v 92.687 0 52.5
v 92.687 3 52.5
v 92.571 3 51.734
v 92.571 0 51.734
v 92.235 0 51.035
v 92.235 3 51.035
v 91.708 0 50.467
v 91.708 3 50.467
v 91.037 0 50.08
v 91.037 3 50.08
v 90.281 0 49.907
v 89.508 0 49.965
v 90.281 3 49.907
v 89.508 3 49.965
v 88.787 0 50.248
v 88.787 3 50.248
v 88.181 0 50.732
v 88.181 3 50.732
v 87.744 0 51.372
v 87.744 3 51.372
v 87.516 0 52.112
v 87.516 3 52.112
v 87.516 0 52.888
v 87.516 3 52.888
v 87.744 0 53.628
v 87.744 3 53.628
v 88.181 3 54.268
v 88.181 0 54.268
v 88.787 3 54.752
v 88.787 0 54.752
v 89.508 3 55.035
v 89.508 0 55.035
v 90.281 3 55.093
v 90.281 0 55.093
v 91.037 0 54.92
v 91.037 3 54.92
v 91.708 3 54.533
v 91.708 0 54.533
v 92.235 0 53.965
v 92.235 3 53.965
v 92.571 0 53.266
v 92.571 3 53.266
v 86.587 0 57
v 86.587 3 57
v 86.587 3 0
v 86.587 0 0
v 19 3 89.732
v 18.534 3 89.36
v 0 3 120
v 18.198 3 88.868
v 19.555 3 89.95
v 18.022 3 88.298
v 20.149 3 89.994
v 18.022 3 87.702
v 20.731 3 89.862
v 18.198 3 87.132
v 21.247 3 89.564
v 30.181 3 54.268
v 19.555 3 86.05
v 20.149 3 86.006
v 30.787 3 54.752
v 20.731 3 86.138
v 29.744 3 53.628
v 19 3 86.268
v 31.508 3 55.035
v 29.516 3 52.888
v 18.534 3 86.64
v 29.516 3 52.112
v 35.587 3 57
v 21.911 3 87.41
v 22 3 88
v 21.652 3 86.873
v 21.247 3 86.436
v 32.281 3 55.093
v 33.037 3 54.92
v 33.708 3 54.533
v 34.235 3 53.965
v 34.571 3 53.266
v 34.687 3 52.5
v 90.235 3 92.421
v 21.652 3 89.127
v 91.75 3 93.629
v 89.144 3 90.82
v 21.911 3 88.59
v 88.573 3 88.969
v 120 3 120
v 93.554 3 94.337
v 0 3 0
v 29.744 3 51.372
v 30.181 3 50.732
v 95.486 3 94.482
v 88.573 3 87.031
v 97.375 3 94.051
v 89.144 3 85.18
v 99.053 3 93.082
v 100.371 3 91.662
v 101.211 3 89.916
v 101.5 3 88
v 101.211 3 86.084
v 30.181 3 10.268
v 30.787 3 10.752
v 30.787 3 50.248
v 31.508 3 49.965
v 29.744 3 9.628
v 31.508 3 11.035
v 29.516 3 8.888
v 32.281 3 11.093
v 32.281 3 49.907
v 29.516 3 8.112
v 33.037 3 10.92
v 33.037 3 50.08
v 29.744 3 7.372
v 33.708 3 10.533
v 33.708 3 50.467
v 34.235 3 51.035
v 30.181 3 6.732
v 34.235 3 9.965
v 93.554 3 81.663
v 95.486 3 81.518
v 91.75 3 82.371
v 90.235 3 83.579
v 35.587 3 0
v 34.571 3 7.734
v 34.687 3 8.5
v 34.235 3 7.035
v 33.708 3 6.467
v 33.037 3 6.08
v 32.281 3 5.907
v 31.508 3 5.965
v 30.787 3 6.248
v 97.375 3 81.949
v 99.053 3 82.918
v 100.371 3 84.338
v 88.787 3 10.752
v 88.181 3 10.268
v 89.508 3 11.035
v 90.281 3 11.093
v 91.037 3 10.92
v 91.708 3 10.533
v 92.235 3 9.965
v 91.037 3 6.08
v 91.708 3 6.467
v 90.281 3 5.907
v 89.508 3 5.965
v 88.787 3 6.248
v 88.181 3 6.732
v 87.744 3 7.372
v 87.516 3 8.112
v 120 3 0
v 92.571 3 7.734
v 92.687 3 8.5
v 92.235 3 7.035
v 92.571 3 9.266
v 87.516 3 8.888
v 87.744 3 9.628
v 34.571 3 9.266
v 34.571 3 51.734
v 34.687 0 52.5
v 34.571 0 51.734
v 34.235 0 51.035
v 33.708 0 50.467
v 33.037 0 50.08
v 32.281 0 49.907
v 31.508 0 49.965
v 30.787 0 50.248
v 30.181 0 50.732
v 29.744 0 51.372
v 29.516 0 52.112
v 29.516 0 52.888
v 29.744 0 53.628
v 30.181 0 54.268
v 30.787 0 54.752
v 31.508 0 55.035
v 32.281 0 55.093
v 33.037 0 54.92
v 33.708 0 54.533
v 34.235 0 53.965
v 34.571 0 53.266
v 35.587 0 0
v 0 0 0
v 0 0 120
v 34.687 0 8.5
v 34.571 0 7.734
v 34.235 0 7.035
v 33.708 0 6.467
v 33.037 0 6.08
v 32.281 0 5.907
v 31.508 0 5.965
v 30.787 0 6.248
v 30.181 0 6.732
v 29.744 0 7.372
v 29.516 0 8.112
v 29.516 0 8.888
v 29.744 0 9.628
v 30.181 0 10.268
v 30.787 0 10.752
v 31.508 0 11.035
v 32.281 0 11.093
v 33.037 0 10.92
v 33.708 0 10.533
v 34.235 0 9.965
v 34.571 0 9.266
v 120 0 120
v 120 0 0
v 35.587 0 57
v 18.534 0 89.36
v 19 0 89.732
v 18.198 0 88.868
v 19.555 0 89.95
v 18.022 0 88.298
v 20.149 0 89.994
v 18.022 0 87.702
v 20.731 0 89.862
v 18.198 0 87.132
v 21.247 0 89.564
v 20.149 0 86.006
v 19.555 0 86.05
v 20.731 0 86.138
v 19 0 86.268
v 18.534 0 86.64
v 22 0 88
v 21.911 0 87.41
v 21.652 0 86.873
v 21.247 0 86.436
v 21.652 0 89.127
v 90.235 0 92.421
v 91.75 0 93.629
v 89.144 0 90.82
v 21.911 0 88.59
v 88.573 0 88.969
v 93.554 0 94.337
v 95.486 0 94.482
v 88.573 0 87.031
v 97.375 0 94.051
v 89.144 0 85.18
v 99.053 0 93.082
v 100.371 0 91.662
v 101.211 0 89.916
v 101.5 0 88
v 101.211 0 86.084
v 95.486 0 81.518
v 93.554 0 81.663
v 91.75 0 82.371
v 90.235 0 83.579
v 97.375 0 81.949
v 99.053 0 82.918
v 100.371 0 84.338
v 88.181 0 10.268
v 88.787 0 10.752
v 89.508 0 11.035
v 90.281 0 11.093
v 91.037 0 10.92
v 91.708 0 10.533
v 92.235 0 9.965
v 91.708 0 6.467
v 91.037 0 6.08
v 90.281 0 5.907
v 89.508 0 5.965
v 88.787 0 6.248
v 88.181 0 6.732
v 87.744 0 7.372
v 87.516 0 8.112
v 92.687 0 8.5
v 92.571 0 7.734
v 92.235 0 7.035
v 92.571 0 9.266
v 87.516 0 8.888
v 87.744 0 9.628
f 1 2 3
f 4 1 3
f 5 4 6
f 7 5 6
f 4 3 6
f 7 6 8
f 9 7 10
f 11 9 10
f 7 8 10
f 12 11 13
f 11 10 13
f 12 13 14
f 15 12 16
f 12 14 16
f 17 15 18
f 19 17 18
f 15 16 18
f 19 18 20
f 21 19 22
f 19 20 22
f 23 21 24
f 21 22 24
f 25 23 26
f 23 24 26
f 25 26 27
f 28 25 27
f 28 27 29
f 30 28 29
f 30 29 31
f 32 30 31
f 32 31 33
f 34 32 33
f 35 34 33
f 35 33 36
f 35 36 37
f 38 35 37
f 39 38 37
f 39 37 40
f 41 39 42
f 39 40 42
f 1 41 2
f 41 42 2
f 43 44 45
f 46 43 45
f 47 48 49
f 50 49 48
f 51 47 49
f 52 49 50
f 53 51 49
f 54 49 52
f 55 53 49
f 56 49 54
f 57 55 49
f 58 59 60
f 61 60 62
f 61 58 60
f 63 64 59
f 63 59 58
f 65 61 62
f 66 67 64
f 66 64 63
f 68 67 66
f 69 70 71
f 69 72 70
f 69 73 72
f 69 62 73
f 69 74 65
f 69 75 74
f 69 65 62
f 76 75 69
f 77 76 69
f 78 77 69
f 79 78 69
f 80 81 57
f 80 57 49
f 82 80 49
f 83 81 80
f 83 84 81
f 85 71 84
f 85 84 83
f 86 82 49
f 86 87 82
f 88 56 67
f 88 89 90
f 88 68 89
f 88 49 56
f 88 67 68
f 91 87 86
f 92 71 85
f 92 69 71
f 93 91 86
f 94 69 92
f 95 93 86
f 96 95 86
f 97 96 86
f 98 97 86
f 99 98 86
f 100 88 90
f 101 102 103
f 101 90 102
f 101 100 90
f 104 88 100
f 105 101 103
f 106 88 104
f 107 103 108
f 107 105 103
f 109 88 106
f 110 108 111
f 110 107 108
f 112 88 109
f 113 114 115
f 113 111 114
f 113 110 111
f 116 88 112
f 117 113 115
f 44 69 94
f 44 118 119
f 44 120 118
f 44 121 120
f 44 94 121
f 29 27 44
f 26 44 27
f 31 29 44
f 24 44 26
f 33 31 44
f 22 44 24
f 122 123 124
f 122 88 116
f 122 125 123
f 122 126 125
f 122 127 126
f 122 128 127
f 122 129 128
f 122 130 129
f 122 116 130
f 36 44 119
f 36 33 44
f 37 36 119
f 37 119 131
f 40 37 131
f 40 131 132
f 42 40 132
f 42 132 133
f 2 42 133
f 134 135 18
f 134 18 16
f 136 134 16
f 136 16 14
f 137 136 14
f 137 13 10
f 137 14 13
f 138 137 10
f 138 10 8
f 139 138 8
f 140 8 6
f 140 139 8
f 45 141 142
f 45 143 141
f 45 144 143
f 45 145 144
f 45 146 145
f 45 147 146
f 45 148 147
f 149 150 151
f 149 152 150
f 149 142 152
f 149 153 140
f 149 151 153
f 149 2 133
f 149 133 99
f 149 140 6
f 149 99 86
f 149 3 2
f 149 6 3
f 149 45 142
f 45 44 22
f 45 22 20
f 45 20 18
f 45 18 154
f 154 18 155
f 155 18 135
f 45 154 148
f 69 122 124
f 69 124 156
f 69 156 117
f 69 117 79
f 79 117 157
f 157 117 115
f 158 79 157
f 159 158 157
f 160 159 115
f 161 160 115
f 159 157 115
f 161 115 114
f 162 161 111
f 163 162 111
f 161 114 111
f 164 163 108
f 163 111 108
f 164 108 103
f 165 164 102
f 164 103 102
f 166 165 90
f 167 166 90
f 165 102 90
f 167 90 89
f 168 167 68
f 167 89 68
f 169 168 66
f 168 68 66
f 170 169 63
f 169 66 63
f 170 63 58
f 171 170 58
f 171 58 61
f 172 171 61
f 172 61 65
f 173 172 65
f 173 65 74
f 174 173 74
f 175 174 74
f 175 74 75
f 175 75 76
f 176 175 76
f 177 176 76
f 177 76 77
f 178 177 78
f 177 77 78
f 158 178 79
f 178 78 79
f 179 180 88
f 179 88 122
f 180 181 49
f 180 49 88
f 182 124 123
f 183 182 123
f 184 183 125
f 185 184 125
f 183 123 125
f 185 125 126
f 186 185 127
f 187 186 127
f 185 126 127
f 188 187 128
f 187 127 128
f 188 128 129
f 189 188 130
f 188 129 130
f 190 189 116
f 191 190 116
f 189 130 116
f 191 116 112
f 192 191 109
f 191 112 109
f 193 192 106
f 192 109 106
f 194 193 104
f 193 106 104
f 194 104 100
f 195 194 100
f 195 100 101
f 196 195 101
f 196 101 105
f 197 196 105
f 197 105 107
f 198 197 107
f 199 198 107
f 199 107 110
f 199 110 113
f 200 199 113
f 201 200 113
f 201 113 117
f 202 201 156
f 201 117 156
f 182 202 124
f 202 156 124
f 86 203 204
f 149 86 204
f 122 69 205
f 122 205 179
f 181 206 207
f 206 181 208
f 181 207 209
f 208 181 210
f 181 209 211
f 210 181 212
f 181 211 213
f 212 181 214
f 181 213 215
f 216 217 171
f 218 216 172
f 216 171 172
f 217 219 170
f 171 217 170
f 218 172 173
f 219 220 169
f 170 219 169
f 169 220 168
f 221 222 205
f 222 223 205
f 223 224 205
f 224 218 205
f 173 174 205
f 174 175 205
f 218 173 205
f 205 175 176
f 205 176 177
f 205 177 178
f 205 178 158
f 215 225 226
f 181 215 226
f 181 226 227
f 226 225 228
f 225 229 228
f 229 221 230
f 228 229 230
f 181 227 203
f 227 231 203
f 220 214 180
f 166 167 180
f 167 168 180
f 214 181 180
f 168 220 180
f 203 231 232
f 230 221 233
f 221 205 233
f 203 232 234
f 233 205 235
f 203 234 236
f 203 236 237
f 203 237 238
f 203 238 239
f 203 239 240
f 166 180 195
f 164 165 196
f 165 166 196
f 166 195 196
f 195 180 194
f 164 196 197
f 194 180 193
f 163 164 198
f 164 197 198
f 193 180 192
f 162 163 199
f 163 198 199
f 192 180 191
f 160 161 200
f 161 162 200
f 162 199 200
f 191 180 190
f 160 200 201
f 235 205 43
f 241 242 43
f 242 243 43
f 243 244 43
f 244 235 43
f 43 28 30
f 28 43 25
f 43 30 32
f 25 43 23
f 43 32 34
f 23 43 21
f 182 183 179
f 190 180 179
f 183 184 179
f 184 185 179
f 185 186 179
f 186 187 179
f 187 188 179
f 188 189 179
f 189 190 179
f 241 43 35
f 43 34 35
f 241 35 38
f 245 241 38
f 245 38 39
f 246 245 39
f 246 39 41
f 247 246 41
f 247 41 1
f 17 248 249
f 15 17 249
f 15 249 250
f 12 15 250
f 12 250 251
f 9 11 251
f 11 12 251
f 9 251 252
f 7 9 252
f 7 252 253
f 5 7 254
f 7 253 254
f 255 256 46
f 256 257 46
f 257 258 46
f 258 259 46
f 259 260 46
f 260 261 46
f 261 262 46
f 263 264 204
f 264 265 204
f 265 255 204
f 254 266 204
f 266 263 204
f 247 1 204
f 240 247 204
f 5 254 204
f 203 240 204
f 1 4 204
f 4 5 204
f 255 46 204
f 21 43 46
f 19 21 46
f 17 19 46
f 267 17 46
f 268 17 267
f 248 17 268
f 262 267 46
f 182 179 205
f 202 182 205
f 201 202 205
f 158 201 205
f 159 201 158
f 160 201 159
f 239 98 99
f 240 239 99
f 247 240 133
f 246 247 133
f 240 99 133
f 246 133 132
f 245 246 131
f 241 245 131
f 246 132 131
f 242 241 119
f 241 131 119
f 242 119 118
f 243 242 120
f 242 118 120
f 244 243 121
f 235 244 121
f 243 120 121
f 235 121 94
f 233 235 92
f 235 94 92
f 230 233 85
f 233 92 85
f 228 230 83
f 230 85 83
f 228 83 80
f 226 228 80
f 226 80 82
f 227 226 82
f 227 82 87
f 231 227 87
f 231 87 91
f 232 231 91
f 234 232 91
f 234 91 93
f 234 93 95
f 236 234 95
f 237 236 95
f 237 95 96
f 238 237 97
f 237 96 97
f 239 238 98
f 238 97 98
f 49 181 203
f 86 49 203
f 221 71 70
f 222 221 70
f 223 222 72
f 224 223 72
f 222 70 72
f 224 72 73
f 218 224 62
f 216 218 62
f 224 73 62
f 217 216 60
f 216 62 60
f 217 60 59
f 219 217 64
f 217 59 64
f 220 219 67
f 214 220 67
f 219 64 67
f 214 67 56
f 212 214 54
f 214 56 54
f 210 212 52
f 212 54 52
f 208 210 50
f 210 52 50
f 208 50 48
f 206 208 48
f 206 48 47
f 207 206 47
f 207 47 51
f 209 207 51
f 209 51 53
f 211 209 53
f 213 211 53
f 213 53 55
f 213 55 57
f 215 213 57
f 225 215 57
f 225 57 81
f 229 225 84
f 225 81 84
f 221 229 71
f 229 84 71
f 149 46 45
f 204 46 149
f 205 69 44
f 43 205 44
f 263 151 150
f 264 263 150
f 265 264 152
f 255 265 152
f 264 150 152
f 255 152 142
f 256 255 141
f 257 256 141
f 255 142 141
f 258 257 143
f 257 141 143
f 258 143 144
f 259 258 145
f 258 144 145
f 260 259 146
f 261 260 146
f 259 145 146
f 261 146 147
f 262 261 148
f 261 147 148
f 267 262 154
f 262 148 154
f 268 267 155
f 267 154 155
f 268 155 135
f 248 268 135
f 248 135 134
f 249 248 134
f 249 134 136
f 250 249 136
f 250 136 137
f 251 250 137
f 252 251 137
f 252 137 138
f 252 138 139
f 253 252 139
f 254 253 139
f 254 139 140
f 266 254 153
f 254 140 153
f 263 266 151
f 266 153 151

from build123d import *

# Parameters (mm, degrees)
SKETCH_1_W          = 120
SKETCH_1_H          = 120
EXTRUDE_1_DEPTH     = 3
SKETCH_2_R          = 2
SKETCH_2_R_2        = 6.5
SKETCH_2_R_3        = 2.6
SKETCH_2_W          = 51
SKETCH_2_H          = 57
CUT_EXTRUDE_1_DEPTH = 3


with BuildPart() as part:
    # 草图1 → 凸台-拉伸1 (new body)
    with BuildSketch(Plane(origin=(0, 0, 0), x_dir=(1, 0, 0), z_dir=(0, 1, 0))):
        with Locations((60, -60)):
            Rectangle(SKETCH_1_W, SKETCH_1_H)
    extrude(amount=EXTRUDE_1_DEPTH)

    # 草图2 → 切除-拉伸1 (cut)
    with BuildSketch(Plane(origin=(0, 3, 0), x_dir=(1, 0, 0), z_dir=(0, 1, 0))):
        with Locations((20, -88)):
            Circle(SKETCH_2_R)
        with Locations((95, -88)):
            Circle(SKETCH_2_R_2)
        with Locations((32.086613668, -8.5)):
            Circle(SKETCH_2_R_3)
        with Locations((32.086613668, -52.5)):
            Circle(SKETCH_2_R_3)
        with Locations((90.086613668, -8.5)):
            Circle(SKETCH_2_R_3)
        with Locations((90.086613668, -52.5)):
            Circle(SKETCH_2_R_3)
        with Locations((61.086613668, -28.5)):
            Rectangle(SKETCH_2_W, SKETCH_2_H)
    extrude(amount=-CUT_EXTRUDE_1_DEPTH, mode=Mode.SUBTRACT)


solid = part.part
